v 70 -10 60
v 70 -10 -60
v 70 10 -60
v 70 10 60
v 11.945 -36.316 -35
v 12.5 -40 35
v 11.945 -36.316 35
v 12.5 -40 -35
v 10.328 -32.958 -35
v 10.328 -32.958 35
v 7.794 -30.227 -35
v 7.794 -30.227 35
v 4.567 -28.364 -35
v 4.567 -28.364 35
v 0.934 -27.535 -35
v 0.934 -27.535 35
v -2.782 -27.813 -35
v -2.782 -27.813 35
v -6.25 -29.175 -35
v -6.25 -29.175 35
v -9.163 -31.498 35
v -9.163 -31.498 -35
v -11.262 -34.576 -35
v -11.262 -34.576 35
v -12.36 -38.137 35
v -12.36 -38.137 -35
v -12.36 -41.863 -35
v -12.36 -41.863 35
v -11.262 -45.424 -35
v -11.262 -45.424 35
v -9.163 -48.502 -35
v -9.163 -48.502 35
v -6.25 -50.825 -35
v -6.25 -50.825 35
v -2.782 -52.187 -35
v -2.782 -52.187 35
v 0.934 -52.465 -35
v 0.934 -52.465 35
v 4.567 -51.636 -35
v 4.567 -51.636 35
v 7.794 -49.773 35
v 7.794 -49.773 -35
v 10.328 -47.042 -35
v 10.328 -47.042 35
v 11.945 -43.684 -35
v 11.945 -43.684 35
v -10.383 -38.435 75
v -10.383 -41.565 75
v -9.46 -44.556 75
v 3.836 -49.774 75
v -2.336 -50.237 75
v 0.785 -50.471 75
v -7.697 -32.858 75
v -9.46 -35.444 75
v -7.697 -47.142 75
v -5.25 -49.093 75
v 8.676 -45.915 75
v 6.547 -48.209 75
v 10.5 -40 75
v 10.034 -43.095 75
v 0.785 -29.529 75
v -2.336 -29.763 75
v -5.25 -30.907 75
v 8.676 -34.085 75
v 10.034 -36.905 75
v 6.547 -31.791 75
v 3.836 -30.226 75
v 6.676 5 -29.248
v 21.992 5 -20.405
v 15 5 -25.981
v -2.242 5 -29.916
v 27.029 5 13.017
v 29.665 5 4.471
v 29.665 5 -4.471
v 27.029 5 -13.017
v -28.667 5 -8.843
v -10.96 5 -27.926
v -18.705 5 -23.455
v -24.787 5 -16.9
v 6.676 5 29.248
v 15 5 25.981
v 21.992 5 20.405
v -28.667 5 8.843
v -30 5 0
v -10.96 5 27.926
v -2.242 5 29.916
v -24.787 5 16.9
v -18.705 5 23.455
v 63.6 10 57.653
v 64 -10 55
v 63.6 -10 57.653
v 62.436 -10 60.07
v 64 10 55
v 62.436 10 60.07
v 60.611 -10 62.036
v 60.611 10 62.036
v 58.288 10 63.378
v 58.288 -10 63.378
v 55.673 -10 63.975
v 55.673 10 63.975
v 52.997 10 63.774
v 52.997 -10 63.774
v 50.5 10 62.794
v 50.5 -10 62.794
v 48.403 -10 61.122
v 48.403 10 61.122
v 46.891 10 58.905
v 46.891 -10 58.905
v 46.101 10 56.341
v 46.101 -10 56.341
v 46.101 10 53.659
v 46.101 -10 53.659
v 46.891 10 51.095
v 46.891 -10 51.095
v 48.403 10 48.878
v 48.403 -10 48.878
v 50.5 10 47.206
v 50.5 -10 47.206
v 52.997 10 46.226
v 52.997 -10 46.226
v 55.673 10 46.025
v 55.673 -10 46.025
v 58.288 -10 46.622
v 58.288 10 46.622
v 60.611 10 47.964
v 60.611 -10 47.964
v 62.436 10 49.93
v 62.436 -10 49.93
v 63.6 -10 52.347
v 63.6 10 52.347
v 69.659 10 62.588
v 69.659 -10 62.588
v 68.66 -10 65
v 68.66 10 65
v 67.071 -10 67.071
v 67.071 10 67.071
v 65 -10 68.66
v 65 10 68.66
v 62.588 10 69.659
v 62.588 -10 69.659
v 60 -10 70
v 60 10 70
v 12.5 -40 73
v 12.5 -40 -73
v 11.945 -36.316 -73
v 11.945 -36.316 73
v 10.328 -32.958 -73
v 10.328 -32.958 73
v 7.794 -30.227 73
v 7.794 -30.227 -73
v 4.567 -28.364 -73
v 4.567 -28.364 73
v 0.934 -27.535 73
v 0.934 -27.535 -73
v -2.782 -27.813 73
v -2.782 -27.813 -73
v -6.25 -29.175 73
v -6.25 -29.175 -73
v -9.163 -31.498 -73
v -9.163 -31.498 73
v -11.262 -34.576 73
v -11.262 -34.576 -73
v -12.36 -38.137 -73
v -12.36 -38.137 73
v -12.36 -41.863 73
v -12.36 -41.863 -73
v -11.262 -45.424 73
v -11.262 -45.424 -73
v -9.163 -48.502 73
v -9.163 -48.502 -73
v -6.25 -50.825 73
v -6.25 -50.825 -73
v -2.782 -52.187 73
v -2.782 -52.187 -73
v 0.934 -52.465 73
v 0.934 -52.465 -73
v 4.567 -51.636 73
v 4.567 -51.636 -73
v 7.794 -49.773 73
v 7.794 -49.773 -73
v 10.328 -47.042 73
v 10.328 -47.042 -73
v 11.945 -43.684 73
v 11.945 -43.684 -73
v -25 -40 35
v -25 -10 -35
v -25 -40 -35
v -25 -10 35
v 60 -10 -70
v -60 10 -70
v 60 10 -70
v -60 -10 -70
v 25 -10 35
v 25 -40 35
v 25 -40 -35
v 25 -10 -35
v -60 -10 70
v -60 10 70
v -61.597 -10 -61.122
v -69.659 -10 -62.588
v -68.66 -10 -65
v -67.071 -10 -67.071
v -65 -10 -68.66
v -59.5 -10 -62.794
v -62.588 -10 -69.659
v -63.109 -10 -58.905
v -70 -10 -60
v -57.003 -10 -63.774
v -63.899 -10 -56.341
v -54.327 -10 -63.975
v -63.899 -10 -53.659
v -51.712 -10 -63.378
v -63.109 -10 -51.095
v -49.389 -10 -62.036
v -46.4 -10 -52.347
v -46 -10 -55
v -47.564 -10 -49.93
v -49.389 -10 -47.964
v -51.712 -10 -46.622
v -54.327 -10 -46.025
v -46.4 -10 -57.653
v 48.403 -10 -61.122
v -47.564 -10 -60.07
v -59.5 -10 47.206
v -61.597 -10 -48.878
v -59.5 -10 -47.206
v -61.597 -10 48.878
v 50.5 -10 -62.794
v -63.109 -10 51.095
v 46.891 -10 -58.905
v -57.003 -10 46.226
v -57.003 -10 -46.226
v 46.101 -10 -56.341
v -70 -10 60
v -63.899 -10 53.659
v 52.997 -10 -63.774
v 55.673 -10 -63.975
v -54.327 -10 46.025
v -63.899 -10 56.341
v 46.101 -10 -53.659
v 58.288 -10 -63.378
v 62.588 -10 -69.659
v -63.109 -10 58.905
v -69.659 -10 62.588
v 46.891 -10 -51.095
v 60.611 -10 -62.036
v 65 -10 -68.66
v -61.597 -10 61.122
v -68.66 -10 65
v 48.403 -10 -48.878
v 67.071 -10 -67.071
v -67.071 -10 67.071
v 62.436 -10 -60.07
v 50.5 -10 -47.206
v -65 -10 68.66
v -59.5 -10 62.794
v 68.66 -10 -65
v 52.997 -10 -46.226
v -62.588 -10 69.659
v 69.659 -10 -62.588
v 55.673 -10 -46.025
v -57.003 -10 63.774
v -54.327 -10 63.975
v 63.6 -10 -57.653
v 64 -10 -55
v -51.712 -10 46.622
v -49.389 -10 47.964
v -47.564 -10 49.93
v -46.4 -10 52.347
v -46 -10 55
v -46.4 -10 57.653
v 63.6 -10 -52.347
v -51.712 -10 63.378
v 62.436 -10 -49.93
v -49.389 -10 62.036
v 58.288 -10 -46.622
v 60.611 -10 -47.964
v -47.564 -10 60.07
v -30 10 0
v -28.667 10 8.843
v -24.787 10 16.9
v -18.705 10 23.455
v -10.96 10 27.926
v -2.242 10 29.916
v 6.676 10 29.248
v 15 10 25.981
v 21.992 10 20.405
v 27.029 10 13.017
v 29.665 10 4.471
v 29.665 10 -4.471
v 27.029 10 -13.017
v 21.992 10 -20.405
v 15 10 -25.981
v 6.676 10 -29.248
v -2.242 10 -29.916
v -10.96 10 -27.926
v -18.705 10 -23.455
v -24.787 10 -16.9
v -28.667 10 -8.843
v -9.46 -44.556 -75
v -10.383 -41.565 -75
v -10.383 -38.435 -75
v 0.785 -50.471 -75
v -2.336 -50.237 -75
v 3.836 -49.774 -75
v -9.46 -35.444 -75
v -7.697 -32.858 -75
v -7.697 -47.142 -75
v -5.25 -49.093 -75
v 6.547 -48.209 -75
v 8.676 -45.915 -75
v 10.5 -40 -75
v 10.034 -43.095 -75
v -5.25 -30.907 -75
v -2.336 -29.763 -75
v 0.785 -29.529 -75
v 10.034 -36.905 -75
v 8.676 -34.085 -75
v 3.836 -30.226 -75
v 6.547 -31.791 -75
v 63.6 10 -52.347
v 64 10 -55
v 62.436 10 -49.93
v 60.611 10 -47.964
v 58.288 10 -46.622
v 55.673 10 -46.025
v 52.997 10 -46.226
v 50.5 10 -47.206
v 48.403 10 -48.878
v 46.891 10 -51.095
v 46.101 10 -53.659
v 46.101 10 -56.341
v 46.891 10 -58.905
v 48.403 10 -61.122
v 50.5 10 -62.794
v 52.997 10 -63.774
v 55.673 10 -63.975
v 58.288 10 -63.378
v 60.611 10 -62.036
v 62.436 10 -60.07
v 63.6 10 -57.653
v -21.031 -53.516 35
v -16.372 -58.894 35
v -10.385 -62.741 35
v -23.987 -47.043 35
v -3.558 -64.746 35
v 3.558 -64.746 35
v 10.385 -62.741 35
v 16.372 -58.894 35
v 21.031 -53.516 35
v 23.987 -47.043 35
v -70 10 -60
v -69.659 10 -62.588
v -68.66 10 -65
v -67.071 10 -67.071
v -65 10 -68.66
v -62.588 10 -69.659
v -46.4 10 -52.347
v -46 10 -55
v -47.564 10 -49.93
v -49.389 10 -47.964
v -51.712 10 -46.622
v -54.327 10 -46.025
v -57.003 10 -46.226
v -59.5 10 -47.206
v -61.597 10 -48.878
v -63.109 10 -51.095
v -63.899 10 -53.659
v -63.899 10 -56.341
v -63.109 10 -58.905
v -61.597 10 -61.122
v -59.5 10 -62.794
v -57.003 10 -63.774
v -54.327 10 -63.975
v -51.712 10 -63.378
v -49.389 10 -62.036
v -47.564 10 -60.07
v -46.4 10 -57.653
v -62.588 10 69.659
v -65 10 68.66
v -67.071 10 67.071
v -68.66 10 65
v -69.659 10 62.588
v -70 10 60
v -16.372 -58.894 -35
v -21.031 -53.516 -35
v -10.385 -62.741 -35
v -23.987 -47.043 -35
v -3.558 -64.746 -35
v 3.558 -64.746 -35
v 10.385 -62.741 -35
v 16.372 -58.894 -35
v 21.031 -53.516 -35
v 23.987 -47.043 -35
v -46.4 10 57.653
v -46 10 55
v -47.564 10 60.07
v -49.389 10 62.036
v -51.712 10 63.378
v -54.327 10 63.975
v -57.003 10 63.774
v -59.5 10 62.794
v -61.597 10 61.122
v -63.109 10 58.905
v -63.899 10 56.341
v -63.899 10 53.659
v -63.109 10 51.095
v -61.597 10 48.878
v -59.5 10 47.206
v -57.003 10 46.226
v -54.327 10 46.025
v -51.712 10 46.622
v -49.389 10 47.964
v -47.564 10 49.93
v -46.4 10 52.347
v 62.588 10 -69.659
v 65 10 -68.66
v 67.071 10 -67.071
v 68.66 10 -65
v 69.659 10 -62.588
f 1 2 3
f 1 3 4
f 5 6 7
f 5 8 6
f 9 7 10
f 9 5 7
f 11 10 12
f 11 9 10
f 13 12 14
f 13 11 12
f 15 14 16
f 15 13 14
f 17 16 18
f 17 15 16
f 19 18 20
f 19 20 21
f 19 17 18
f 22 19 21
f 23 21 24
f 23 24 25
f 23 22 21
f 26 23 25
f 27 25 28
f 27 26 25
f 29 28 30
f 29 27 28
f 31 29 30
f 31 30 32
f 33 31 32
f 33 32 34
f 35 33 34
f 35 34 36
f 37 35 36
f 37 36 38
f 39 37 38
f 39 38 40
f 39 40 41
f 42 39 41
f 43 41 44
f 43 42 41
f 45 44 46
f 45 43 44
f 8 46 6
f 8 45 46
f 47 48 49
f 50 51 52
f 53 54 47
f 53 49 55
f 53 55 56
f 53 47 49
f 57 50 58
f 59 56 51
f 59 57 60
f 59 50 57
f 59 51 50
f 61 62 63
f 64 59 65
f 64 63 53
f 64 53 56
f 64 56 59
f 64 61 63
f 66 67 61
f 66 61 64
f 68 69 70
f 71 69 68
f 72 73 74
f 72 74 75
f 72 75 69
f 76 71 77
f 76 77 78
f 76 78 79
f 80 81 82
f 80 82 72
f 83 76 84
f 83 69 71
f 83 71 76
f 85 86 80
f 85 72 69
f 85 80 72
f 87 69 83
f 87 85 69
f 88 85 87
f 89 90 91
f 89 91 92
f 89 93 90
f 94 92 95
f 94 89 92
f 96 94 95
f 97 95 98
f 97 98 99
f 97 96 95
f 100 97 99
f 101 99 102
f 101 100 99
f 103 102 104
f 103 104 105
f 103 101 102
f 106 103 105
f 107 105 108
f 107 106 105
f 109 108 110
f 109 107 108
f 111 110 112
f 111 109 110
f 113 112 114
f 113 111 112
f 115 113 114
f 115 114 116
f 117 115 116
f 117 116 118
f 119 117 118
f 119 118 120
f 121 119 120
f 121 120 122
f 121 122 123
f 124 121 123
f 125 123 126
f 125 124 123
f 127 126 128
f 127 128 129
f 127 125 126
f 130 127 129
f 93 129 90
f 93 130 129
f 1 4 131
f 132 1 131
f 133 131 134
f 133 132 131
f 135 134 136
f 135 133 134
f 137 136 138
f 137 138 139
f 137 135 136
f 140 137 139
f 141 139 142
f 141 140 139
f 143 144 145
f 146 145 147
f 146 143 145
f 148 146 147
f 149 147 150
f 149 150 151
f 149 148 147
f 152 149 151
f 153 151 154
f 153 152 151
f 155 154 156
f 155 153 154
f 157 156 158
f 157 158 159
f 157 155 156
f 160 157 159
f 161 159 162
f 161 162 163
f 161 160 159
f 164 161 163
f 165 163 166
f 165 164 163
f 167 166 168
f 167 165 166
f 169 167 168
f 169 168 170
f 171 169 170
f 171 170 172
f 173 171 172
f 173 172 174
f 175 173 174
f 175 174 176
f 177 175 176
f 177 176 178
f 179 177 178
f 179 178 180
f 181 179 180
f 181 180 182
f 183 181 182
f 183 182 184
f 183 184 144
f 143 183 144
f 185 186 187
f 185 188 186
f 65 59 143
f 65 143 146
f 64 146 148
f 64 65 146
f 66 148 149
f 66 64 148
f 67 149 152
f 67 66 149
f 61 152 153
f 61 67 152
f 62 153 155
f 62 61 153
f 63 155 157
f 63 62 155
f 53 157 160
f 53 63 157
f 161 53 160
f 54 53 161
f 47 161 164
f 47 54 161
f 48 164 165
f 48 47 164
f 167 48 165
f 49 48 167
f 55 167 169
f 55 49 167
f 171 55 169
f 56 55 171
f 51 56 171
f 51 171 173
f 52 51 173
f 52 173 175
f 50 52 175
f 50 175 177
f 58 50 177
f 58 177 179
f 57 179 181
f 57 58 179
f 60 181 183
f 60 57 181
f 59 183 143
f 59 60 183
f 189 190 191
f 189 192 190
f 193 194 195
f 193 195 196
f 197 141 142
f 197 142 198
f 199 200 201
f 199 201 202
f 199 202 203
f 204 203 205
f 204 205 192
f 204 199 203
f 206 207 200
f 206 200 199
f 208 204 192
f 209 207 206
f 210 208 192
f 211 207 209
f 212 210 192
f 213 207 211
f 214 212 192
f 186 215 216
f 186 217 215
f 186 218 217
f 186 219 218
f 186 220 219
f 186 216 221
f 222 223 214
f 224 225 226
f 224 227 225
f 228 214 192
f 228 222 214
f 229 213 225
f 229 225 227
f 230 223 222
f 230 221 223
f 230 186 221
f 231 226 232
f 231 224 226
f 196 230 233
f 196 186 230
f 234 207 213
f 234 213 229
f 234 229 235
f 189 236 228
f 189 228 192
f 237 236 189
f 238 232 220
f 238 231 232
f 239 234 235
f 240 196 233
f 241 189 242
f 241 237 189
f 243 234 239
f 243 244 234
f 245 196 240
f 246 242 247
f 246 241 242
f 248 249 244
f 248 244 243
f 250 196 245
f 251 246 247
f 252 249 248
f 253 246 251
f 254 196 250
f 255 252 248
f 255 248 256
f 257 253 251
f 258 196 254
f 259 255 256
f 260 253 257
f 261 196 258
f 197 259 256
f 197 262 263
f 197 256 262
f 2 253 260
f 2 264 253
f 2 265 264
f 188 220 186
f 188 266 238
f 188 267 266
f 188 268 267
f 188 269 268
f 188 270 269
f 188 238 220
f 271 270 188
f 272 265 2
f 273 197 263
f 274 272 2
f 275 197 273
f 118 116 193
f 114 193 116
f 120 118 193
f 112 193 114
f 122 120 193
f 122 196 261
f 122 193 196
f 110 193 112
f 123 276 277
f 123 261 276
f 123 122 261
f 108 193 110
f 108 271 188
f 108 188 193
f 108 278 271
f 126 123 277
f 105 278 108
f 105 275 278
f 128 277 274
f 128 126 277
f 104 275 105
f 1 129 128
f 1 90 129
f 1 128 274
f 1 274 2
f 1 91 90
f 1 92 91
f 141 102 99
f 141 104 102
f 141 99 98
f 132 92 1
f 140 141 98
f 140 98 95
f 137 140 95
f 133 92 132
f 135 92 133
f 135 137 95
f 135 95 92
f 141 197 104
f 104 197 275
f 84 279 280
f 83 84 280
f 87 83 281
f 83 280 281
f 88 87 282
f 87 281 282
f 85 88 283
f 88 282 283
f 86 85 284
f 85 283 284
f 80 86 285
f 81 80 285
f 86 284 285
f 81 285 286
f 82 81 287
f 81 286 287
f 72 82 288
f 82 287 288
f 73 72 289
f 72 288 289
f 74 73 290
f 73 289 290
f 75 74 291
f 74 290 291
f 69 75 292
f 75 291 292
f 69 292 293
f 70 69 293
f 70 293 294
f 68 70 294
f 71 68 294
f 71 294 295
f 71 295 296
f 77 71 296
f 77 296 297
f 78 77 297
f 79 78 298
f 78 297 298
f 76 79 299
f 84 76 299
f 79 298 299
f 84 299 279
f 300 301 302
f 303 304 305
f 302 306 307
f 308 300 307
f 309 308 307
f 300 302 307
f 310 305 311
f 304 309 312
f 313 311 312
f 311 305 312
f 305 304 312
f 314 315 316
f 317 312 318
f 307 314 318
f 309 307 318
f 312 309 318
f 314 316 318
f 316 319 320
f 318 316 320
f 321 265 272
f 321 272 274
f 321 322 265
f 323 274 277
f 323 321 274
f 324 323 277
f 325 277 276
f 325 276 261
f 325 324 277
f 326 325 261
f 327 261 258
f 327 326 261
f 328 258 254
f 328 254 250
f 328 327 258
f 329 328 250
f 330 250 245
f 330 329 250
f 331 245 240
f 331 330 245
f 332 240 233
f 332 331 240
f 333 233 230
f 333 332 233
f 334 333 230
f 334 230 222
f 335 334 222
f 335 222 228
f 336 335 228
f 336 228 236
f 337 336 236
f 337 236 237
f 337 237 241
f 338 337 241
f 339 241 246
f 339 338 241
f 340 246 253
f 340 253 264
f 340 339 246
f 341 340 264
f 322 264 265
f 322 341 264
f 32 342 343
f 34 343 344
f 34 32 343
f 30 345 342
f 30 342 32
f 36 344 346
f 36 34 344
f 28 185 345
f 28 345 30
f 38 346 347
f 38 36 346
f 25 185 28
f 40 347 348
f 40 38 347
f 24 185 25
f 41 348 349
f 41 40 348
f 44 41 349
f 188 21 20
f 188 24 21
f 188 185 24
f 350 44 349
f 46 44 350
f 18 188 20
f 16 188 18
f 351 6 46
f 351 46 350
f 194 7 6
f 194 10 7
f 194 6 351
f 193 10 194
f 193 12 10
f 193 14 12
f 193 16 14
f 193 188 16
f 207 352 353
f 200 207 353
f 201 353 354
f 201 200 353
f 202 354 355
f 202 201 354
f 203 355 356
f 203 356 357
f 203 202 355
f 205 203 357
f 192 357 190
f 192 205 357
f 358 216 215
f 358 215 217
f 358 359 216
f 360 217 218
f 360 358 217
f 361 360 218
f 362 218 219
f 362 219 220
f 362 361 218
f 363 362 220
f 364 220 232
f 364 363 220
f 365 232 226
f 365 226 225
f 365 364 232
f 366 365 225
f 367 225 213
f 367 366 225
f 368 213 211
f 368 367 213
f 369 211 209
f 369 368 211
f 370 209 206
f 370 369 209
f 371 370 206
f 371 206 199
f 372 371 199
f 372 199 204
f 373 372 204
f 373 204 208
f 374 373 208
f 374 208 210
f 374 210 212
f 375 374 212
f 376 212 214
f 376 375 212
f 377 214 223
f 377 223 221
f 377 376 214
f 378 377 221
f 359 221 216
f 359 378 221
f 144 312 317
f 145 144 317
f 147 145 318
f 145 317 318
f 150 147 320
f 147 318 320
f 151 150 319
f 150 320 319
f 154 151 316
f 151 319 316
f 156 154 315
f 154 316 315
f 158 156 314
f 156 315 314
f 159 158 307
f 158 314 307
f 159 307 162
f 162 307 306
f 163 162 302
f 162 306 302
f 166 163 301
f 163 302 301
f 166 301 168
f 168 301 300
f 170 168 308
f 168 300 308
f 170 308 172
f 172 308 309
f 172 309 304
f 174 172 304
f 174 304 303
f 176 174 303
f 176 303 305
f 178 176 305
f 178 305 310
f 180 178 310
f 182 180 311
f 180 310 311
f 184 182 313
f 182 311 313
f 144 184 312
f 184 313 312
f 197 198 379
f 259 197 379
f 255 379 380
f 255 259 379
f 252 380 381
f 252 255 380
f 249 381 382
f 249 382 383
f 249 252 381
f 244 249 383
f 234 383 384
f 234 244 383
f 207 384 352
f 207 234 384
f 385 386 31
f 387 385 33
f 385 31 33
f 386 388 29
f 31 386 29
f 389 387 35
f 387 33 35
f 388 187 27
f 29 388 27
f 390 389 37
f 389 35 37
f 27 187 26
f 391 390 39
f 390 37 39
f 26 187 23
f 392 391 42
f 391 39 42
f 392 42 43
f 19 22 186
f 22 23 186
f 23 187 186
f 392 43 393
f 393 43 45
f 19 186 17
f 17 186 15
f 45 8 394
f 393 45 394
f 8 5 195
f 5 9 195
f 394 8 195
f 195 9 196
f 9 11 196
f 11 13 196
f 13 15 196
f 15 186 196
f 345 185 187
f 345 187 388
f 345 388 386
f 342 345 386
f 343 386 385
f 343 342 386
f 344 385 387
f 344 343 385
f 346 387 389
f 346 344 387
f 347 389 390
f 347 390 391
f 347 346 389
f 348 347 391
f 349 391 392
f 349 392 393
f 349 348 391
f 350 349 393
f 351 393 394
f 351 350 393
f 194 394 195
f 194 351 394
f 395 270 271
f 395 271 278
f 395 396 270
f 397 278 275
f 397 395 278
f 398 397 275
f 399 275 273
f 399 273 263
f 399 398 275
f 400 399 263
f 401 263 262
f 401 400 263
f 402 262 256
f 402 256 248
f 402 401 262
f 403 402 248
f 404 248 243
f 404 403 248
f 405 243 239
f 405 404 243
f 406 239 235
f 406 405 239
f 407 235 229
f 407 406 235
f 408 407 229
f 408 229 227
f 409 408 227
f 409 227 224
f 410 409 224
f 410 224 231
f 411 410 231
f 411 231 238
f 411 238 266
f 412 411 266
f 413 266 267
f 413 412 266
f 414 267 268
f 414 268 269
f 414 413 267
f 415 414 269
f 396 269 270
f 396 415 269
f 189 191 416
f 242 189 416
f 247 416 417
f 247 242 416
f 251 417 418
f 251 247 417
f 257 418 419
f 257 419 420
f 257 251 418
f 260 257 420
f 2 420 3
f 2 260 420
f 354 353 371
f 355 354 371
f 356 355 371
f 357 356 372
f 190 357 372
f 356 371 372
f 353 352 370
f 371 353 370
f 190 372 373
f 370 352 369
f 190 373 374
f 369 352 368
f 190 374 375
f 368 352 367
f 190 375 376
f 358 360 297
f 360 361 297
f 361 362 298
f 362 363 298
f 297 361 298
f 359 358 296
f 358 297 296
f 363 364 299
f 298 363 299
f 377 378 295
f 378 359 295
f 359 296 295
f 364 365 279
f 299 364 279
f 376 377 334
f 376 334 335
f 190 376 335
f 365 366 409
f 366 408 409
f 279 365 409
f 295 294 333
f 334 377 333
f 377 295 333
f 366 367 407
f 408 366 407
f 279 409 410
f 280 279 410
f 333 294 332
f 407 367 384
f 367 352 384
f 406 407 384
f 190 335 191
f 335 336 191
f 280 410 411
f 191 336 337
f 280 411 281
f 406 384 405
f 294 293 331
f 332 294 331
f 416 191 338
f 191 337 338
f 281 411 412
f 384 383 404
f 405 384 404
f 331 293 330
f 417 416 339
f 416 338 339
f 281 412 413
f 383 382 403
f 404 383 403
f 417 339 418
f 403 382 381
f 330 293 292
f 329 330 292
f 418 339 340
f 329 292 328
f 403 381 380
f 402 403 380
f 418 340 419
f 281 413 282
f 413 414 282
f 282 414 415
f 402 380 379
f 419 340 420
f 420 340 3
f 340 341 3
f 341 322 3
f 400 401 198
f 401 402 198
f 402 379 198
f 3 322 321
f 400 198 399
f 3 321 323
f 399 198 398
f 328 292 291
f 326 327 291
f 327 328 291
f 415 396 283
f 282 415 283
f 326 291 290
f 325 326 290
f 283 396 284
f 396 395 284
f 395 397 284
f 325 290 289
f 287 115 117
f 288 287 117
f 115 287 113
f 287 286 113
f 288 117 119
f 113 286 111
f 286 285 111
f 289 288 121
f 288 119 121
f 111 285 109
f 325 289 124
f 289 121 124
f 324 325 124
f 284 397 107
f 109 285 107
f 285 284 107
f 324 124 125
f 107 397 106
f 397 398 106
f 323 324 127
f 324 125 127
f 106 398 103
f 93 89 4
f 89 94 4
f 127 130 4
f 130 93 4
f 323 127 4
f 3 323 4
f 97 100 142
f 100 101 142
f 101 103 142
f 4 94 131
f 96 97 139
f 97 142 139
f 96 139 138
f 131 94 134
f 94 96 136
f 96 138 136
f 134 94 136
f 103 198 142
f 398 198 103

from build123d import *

# Parameters (mm, degrees)
F0_R     = 9
F1_DEPTH = 10
F3_R     = 12.5
F4_DEPTH = 35
F5_R     = 30
F6_DEPTH = 5
F7_DEPTH = 75
F8_SIZE  = 2


with BuildPart() as f1:
    # F0 (on Front) → F1 (new body, symmetric)
    with BuildSketch(Plane.XZ):
        with BuildLine():
            Line((-60, -70), (60, -70))
            ThreePointArc((60, -70), (67.0710678119, -67.0710678119), (70, -60))
            Line((70, -60), (70, 60))
            ThreePointArc((70, 60), (67.0710678119, 67.0710678119), (60, 70))
            Line((60, 70), (-60, 70))
            ThreePointArc((-60, 70), (-67.0710678119, 67.0710678119), (-70, 60))
            Line((-70, 60), (-70, -60))
            ThreePointArc((-70, -60), (-67.0710678119, -67.0710678119), (-60, -70))
        make_face()
        with Locations((-55, -55)):
            Circle(F0_R, mode=Mode.SUBTRACT)
        with Locations((55, -55)):
            Circle(F0_R, mode=Mode.SUBTRACT)
        with Locations((-55, 55)):
            Circle(F0_R, mode=Mode.SUBTRACT)
        with Locations((55, 55)):
            Circle(F0_R, mode=Mode.SUBTRACT)
    extrude(amount=F1_DEPTH, both=True)

    # F3 (on Top) → F4 (join, symmetric)
    with BuildSketch(Plane.XY):
        with BuildLine():
            Line((-25, -10), (-25, -40))
            ThreePointArc((-25, -40), (0, -65), (25, -40))
            Line((25, -40), (25, -10))
            Line((25, -10), (-25, -10))
        make_face()
        with Locations((0, -40)):
            Circle(F3_R, mode=Mode.SUBTRACT)
    extrude(amount=F4_DEPTH, both=True)

    # F5 (on face) → F6 (cut)
    with BuildSketch(Plane(origin=(0, 10, 0), x_dir=(-1, 0, 0), z_dir=(0, 1, 0))):
        Circle(F5_R)
    extrude(amount=-F6_DEPTH, mode=Mode.SUBTRACT)


with BuildPart() as f7:
    # F3 (on Top) → F7 (new body, symmetric)
    with BuildSketch(Plane.XY):
        with Locations((0, -40)):
            Circle(F3_R)
    extrude(amount=F7_DEPTH, both=True)

    # F8
    f8_edges = [f7.edges().sort_by_distance(p)[0] for p in [
        (-12.5, -40, 75),
        (-12.5, -40, -75),
    ]]
    chamfer(f8_edges, length=F8_SIZE)


solid = Compound([f1.part, f7.part])
